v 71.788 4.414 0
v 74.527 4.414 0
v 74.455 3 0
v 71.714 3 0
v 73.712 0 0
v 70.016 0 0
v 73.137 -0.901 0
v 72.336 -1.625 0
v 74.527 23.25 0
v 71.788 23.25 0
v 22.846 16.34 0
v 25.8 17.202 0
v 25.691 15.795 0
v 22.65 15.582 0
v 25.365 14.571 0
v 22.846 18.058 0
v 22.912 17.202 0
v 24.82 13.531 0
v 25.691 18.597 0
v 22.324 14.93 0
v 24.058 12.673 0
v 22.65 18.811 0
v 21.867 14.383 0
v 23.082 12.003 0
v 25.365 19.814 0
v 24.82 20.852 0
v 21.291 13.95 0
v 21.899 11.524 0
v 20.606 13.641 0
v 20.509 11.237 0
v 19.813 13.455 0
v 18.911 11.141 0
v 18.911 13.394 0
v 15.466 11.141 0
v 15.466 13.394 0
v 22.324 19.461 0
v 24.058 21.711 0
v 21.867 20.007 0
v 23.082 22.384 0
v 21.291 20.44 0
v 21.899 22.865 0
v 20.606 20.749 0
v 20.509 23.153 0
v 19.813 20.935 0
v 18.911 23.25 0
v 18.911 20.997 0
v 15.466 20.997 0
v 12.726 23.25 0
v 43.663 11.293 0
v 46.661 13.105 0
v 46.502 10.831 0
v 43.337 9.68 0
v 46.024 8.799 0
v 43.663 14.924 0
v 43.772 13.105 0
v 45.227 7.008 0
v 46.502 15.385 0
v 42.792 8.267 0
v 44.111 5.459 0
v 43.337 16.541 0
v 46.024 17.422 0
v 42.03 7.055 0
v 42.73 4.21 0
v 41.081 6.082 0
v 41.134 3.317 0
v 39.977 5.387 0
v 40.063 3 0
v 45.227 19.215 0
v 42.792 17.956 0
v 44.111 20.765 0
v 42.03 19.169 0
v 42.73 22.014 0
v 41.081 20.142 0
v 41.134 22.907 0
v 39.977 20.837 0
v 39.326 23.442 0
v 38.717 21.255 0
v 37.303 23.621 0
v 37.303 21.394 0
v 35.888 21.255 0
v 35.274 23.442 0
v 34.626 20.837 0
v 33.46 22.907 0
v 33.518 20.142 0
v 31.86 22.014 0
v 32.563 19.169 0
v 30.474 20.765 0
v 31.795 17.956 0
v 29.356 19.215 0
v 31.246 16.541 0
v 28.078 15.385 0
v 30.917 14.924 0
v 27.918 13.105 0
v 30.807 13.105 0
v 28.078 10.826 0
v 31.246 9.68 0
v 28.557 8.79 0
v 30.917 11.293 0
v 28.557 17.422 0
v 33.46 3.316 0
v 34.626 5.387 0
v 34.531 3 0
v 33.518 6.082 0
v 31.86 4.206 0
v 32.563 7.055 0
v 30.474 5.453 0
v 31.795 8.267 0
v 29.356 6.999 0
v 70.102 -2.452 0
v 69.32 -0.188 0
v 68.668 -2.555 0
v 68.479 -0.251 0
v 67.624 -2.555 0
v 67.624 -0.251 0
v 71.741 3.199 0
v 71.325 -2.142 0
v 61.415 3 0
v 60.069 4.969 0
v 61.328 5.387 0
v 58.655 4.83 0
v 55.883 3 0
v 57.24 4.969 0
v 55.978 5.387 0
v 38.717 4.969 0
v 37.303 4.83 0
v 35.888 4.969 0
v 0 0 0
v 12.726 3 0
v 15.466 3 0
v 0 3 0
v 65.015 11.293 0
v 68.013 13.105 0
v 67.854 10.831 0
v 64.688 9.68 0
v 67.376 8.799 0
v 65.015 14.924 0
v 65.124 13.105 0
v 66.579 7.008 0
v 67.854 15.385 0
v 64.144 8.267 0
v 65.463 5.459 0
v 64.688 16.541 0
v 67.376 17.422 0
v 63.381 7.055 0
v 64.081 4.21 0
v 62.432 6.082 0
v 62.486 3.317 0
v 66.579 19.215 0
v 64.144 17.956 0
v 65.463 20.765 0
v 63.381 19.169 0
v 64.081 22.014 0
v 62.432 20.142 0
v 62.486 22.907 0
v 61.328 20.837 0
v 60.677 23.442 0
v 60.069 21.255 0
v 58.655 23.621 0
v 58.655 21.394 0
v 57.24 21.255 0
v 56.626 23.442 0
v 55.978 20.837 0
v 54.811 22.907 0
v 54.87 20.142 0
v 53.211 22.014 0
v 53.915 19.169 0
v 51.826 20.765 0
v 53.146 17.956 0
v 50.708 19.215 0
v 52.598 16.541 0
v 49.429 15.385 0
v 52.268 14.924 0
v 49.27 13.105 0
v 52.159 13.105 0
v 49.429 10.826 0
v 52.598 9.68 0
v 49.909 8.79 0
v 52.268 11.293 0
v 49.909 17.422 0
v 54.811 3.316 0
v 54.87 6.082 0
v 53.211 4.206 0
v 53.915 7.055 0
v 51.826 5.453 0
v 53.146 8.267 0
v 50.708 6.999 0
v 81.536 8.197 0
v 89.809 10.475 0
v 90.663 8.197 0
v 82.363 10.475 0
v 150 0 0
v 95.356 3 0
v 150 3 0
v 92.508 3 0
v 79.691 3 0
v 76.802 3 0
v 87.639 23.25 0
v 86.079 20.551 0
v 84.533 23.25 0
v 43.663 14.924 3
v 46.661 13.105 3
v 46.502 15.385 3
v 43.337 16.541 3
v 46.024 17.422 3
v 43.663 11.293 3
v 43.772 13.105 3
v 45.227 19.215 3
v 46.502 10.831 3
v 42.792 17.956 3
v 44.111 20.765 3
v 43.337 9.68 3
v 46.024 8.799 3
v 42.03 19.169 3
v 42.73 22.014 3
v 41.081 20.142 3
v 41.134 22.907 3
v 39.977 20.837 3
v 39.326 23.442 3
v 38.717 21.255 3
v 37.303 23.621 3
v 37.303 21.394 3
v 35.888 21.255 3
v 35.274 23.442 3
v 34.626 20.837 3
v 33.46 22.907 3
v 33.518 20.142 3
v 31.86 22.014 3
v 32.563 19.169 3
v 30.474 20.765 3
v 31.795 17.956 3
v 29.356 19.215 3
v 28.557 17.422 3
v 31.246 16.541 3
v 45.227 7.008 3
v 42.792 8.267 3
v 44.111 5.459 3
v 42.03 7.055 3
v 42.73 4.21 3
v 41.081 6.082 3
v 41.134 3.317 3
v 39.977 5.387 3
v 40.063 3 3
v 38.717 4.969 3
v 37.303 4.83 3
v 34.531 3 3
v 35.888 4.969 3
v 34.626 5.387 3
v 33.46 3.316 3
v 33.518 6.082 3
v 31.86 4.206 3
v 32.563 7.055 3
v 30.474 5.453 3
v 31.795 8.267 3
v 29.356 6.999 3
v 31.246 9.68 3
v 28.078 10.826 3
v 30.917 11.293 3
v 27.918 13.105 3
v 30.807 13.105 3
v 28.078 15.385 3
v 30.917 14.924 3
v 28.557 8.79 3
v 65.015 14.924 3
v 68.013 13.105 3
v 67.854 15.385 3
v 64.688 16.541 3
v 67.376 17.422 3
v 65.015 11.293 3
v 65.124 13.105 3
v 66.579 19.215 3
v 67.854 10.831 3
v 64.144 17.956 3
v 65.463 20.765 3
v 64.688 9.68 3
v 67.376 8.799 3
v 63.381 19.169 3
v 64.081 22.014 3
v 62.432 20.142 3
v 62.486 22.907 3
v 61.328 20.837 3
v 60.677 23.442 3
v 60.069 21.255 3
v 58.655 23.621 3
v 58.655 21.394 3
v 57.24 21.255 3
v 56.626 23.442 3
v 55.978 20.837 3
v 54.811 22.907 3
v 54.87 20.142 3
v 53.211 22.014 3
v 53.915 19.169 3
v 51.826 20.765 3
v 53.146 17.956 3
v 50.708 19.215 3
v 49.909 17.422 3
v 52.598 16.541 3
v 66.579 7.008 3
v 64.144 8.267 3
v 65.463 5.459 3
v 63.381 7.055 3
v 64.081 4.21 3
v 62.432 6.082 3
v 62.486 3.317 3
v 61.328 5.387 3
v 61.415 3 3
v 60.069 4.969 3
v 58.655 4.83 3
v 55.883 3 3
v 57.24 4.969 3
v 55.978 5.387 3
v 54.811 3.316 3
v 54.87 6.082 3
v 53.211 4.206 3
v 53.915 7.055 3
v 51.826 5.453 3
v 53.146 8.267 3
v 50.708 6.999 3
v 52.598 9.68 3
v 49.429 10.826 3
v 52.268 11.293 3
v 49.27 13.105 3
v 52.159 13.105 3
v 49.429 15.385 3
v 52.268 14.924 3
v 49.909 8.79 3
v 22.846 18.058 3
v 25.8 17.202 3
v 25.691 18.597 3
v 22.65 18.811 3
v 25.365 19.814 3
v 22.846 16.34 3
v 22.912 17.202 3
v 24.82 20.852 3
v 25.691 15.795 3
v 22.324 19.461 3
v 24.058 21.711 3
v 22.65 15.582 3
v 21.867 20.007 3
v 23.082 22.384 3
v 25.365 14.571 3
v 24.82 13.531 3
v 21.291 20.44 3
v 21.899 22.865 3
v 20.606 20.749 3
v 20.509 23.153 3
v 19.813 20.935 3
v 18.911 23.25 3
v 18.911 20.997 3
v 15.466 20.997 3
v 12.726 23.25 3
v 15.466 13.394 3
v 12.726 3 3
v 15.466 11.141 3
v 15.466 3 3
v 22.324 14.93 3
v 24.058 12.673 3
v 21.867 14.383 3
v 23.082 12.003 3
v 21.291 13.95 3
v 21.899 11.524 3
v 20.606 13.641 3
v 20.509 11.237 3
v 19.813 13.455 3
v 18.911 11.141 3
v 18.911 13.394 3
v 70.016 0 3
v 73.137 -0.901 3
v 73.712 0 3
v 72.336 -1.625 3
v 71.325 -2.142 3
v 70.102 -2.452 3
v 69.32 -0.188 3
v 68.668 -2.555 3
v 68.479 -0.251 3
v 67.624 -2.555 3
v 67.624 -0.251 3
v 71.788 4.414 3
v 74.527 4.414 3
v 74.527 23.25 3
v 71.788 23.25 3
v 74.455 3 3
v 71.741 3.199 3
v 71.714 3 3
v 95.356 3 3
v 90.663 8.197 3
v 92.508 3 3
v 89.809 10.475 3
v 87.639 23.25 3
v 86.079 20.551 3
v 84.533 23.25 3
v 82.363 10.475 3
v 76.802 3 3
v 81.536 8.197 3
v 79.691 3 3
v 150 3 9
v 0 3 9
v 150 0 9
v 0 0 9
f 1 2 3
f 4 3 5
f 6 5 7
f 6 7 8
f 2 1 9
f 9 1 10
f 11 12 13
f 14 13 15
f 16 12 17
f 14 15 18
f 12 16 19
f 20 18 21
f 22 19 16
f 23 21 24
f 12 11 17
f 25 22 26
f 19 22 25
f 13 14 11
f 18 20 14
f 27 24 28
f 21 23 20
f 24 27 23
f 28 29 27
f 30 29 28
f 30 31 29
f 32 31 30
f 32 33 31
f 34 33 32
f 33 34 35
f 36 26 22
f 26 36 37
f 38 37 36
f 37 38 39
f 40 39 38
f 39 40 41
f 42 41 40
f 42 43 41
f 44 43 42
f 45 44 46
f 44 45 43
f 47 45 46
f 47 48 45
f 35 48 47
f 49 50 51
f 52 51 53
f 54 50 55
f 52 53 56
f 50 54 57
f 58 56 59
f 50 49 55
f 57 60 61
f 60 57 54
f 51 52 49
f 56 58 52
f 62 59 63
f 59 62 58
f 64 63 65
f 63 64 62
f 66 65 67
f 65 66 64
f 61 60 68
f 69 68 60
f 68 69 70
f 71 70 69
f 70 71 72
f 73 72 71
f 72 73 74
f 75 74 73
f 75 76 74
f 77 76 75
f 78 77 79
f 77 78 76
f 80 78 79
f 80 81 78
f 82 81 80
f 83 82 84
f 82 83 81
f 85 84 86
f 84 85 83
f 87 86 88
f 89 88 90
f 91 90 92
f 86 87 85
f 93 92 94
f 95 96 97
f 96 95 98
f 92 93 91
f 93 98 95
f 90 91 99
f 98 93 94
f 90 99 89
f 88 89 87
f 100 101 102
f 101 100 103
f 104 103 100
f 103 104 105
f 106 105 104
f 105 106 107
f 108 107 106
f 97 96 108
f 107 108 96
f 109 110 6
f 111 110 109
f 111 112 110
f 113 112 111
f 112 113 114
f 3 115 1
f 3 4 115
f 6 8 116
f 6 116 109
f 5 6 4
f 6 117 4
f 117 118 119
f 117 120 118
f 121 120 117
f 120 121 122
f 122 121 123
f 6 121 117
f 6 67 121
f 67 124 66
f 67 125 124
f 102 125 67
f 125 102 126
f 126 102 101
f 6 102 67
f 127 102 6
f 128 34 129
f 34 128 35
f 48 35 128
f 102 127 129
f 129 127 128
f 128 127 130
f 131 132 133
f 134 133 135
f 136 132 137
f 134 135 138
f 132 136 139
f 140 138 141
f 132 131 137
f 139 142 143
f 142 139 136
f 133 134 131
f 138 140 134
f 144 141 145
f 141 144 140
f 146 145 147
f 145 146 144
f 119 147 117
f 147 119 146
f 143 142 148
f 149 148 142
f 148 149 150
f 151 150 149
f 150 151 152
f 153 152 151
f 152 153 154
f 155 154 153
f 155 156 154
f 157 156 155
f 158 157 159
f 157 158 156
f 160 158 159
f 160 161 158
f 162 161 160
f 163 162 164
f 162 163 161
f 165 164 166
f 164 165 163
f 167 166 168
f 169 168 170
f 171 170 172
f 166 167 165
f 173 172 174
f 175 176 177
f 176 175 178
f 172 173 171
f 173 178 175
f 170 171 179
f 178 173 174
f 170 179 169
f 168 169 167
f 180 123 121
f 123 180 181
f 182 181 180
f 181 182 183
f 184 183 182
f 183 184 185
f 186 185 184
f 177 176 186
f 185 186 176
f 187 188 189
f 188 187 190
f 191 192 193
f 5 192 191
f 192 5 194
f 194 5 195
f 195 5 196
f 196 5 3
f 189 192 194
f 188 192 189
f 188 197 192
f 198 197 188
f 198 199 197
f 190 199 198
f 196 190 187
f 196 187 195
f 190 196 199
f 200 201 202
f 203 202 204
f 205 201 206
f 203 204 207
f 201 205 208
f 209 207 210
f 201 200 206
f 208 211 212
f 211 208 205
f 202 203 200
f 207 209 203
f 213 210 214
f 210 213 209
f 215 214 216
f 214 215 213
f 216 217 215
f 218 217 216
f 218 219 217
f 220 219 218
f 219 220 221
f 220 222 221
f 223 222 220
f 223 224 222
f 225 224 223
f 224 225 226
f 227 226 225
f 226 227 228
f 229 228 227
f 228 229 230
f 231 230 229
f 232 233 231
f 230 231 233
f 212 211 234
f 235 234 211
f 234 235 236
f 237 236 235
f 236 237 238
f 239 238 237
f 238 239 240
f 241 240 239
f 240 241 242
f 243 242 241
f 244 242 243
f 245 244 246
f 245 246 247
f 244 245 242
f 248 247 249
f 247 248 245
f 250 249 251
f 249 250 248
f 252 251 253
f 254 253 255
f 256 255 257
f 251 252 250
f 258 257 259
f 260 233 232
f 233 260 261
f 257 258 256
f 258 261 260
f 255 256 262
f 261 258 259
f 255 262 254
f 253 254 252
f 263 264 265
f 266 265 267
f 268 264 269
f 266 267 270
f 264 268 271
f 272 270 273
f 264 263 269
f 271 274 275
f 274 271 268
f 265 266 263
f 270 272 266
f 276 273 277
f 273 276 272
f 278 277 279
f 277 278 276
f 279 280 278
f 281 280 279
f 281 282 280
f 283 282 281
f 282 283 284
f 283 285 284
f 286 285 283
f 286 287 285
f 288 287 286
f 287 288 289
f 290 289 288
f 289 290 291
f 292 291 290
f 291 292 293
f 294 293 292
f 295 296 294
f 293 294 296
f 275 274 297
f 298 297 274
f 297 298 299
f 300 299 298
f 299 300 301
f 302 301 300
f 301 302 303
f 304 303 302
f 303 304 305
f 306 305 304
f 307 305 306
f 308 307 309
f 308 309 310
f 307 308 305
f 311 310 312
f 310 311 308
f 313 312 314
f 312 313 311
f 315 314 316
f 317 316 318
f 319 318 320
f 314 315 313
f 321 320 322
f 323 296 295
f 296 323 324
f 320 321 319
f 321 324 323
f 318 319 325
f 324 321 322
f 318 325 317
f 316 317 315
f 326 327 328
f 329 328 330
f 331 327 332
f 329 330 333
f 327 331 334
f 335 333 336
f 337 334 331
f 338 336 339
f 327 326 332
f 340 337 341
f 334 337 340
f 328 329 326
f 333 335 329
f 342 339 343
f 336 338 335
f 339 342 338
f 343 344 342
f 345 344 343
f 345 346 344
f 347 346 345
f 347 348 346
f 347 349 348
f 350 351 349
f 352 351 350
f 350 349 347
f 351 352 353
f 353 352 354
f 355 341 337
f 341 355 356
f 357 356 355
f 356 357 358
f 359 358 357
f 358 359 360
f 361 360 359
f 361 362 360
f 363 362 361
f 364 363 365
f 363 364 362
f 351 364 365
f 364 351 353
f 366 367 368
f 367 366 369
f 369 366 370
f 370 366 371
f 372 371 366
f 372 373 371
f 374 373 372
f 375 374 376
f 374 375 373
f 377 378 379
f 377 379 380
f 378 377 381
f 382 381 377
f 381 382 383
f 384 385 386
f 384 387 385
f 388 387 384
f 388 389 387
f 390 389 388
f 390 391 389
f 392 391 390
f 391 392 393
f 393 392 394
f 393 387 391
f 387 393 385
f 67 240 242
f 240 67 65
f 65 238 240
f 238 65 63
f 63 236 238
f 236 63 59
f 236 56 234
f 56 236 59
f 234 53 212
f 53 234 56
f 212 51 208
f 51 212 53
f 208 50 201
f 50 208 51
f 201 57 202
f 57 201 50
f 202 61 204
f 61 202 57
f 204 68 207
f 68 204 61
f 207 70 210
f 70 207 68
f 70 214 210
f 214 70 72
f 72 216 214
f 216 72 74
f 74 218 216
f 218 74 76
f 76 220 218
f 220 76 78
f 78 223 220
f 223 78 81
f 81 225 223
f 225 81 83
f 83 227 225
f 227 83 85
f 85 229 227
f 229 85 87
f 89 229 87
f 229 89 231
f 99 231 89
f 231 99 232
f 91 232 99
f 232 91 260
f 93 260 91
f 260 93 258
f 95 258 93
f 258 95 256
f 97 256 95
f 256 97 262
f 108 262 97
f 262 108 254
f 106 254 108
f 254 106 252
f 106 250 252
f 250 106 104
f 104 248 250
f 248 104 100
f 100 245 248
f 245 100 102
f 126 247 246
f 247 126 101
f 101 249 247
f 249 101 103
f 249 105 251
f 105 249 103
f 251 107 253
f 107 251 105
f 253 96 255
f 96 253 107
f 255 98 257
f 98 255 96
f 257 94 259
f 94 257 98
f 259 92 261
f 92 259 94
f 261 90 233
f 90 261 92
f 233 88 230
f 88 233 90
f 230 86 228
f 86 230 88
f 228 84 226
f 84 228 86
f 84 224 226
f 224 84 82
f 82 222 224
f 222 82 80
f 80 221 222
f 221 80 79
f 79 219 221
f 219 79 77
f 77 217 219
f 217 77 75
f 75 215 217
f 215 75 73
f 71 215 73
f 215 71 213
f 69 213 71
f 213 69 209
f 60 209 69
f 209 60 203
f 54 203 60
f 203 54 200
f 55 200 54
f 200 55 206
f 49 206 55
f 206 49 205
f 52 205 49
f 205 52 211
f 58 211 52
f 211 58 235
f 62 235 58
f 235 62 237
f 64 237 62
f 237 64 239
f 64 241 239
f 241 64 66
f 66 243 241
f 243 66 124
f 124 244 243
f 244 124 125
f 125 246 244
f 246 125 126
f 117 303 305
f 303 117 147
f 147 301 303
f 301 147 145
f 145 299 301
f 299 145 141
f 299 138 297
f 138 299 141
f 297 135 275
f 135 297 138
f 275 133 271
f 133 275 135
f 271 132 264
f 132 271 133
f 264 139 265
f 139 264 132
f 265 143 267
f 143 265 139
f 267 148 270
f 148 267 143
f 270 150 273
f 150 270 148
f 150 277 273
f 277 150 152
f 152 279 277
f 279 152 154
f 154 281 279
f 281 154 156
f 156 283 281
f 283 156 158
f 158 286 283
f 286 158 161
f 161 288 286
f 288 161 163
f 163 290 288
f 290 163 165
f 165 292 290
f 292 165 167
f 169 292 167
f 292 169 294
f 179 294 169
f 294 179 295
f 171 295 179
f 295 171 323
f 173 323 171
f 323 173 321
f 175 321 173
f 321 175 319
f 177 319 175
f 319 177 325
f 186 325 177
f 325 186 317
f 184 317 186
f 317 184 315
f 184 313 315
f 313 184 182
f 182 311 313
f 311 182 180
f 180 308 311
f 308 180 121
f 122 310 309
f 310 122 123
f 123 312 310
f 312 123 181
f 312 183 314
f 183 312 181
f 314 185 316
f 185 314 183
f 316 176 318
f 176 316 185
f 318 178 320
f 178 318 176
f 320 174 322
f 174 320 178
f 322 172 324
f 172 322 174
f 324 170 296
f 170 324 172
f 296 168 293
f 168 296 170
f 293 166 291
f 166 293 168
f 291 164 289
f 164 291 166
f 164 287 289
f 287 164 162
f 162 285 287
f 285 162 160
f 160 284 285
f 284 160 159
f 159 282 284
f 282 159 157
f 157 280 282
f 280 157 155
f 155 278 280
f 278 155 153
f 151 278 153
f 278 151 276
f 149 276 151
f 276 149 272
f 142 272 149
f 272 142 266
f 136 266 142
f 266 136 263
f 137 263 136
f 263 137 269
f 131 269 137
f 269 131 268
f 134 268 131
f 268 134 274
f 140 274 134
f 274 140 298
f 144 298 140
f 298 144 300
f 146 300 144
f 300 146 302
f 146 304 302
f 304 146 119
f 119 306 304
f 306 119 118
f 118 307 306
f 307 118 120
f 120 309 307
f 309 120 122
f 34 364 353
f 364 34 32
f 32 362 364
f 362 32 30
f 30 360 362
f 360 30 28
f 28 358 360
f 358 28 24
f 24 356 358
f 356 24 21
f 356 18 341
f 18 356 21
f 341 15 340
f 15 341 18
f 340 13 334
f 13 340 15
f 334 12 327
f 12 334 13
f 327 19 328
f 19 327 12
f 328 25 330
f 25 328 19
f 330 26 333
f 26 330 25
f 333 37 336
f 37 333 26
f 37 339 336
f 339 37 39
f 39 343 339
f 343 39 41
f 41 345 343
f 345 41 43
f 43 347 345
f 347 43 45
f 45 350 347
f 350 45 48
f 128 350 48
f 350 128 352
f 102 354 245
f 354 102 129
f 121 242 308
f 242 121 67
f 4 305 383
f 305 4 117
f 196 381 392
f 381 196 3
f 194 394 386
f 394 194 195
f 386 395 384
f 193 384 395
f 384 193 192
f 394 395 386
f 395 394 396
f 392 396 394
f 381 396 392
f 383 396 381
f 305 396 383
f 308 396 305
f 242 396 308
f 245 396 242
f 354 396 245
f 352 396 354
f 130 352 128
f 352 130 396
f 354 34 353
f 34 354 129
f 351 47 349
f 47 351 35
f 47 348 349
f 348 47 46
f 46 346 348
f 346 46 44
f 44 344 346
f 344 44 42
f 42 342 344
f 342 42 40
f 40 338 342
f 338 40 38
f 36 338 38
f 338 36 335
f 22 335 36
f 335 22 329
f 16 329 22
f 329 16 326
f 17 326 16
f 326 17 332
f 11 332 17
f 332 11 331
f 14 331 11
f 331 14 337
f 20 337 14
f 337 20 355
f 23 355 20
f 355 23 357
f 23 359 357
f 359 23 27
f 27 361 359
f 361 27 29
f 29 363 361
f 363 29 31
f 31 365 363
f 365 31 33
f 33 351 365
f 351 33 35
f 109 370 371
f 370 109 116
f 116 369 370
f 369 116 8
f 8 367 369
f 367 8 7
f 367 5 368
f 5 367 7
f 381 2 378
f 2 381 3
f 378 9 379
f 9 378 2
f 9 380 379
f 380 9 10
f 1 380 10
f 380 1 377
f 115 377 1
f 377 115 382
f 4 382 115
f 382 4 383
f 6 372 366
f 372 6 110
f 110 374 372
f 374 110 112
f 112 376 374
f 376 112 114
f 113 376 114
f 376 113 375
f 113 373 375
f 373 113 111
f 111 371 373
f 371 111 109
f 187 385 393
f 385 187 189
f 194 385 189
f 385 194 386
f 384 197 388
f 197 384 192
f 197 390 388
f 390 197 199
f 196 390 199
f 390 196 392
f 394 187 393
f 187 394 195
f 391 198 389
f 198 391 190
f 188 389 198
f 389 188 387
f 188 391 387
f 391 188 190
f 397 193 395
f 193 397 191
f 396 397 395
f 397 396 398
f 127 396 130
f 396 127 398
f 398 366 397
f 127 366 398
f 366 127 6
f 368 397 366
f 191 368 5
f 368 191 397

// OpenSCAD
translate([10, 3, 0])
linear_extrude(height=3)
    text("POOJA", 20, "Cascadia Code Semibold");

cube([150, 3, 9]);
